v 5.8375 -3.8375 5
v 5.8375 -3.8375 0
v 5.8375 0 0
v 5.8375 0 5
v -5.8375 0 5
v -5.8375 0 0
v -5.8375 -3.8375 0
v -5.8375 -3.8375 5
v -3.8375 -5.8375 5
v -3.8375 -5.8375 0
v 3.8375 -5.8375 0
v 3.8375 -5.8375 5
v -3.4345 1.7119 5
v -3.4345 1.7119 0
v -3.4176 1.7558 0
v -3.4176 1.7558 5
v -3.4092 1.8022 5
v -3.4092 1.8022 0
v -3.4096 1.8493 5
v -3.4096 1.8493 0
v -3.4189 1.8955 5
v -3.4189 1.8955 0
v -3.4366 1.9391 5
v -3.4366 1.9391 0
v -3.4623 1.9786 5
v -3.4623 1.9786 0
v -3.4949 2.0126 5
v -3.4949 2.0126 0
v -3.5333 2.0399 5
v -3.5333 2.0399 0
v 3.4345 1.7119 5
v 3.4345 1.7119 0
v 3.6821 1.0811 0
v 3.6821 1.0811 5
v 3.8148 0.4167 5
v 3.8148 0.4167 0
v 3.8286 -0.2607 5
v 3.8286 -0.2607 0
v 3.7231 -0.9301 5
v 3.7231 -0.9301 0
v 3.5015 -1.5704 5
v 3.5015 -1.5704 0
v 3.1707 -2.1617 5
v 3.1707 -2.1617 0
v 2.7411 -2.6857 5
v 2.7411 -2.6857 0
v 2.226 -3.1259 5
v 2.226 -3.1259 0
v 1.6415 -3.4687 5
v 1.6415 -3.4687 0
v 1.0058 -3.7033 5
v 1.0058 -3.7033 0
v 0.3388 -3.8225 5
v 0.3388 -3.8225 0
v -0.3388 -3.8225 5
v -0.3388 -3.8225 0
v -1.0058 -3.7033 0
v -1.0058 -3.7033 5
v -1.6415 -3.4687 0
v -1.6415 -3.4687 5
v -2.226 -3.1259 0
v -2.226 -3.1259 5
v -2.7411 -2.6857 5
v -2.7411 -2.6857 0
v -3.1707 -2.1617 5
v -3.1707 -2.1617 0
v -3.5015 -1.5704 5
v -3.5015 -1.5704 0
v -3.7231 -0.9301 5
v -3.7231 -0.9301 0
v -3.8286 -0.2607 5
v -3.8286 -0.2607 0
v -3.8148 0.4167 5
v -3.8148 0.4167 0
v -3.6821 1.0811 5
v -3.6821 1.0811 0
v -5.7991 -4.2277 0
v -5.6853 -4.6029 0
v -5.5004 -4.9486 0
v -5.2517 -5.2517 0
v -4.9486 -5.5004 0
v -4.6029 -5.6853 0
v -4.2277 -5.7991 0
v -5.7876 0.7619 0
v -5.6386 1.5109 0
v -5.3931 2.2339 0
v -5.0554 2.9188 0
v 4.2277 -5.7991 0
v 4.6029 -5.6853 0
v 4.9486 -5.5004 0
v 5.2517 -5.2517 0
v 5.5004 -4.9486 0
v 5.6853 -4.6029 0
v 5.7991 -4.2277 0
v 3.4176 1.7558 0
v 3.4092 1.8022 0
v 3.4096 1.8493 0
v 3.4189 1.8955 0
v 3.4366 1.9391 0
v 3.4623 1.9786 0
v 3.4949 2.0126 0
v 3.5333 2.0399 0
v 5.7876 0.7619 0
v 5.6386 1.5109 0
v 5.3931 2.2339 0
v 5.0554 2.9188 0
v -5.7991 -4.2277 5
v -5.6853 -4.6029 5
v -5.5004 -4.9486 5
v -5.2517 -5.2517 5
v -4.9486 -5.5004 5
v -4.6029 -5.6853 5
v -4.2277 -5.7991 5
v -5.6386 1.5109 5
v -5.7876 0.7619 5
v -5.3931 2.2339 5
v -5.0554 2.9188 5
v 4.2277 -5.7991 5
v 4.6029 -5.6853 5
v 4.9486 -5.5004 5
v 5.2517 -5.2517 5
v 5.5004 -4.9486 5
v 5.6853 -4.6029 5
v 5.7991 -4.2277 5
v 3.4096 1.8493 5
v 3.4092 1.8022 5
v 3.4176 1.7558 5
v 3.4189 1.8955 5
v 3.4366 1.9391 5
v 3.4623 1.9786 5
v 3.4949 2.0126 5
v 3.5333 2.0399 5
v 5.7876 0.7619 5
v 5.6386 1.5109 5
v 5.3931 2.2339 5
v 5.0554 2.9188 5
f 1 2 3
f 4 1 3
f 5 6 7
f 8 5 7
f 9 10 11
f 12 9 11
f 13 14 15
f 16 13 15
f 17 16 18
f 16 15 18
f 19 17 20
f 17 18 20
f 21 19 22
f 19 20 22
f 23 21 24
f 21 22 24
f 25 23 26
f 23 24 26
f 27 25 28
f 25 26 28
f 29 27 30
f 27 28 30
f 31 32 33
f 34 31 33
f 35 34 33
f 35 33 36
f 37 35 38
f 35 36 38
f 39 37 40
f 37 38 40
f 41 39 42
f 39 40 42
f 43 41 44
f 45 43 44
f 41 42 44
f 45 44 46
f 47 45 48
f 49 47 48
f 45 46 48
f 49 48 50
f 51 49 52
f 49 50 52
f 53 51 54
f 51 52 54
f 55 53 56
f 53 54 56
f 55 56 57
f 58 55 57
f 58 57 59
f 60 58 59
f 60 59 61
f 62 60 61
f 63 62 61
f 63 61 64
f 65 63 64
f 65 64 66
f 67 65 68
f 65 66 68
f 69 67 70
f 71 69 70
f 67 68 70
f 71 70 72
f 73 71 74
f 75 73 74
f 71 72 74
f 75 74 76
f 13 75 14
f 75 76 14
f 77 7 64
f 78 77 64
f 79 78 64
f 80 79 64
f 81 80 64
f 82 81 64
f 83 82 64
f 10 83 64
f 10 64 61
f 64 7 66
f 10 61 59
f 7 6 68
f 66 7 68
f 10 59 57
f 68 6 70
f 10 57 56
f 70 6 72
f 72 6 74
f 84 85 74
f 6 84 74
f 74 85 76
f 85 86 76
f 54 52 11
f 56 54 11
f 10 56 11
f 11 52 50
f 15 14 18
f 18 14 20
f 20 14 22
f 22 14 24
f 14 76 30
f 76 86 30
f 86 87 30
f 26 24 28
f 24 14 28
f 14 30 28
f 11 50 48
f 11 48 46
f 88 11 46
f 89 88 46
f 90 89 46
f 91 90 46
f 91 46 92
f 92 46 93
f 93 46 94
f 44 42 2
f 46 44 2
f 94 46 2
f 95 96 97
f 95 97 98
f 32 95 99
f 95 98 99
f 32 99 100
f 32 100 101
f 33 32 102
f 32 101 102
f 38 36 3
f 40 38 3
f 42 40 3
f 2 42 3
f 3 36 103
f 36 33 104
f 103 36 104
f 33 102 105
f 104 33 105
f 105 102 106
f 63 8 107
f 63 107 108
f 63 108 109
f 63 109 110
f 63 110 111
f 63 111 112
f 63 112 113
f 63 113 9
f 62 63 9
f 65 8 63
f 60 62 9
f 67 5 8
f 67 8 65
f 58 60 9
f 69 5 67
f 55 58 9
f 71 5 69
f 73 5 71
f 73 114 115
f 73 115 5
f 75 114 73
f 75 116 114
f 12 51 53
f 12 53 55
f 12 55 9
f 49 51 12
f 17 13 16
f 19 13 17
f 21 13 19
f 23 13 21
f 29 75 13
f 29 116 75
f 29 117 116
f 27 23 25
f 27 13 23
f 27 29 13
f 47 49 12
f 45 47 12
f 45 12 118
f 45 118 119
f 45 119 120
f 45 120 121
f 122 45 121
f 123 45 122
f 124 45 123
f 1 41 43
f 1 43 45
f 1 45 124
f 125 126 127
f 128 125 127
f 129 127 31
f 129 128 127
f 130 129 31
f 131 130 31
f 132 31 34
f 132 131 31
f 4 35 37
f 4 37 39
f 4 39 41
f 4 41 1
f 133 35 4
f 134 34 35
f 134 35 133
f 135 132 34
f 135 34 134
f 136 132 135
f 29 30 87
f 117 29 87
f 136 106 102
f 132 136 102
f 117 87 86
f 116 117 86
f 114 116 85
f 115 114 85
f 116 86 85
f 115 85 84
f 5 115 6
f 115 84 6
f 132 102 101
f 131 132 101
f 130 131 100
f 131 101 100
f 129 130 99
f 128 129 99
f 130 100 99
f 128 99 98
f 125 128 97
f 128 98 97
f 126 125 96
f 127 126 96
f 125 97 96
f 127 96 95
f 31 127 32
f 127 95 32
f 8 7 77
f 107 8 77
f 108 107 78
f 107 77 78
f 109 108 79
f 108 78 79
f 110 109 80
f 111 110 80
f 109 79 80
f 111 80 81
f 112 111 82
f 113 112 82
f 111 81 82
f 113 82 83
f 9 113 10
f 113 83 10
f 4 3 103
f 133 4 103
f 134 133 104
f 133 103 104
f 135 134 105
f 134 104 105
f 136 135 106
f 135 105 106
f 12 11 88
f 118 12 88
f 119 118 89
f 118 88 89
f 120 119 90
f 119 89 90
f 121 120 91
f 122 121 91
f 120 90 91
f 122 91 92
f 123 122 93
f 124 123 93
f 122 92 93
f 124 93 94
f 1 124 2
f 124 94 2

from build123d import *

# Parameters (mm, degrees)
F1_DEPTH = 5


with BuildPart() as f1:
    # F0 (on Top) → F1 (new body)
    with BuildSketch(Plane.XY):
        with BuildLine():
            ThreePointArc((3.434505, 1.711893), (0, -3.8375), (-3.434505, 1.711893))
            ThreePointArc((-3.434505, 1.711893), (-3.418863, 1.89548), (-3.533252, 2.039924))
            Line((-3.533252, 2.039924), (-5.055423, 2.91875))
            ThreePointArc((-5.055423, 2.91875), (-5.638592, 1.510856), (-5.8375, 0))
            ThreePointArc((-5.8375, 0), (-4.127736, -4.127736), (0, -5.8375))
            ThreePointArc((0, -5.8375), (4.127736, -4.127736), (5.8375, 0))
            ThreePointArc((5.8375, 0), (5.638592, 1.510856), (5.055423, 2.91875))
            Line((5.055423, 2.91875), (3.533252, 2.039924))
            ThreePointArc((3.533252, 2.039924), (3.418863, 1.89548), (3.434505, 1.711893))
        make_face()
        with BuildLine():
            ThreePointArc((0, -5.8375), (-4.127736, -4.127736), (-5.8375, 0))
            Line((-5.8375, 0), (-5.8375, -3.8375))
            ThreePointArc((-5.8375, -3.8375), (-5.251714, -5.251714), (-3.8375, -5.8375))
            Line((-3.8375, -5.8375), (0, -5.8375))
        make_face()
        with BuildLine():
            Line((5.8375, -3.8375), (5.8375, 0))
            ThreePointArc((5.8375, 0), (4.127736, -4.127736), (0, -5.8375))
            Line((0, -5.8375), (3.8375, -5.8375))
            ThreePointArc((3.8375, -5.8375), (5.251714, -5.251714), (5.8375, -3.8375))
        make_face()
    extrude(amount=F1_DEPTH)


solid = f1.part
